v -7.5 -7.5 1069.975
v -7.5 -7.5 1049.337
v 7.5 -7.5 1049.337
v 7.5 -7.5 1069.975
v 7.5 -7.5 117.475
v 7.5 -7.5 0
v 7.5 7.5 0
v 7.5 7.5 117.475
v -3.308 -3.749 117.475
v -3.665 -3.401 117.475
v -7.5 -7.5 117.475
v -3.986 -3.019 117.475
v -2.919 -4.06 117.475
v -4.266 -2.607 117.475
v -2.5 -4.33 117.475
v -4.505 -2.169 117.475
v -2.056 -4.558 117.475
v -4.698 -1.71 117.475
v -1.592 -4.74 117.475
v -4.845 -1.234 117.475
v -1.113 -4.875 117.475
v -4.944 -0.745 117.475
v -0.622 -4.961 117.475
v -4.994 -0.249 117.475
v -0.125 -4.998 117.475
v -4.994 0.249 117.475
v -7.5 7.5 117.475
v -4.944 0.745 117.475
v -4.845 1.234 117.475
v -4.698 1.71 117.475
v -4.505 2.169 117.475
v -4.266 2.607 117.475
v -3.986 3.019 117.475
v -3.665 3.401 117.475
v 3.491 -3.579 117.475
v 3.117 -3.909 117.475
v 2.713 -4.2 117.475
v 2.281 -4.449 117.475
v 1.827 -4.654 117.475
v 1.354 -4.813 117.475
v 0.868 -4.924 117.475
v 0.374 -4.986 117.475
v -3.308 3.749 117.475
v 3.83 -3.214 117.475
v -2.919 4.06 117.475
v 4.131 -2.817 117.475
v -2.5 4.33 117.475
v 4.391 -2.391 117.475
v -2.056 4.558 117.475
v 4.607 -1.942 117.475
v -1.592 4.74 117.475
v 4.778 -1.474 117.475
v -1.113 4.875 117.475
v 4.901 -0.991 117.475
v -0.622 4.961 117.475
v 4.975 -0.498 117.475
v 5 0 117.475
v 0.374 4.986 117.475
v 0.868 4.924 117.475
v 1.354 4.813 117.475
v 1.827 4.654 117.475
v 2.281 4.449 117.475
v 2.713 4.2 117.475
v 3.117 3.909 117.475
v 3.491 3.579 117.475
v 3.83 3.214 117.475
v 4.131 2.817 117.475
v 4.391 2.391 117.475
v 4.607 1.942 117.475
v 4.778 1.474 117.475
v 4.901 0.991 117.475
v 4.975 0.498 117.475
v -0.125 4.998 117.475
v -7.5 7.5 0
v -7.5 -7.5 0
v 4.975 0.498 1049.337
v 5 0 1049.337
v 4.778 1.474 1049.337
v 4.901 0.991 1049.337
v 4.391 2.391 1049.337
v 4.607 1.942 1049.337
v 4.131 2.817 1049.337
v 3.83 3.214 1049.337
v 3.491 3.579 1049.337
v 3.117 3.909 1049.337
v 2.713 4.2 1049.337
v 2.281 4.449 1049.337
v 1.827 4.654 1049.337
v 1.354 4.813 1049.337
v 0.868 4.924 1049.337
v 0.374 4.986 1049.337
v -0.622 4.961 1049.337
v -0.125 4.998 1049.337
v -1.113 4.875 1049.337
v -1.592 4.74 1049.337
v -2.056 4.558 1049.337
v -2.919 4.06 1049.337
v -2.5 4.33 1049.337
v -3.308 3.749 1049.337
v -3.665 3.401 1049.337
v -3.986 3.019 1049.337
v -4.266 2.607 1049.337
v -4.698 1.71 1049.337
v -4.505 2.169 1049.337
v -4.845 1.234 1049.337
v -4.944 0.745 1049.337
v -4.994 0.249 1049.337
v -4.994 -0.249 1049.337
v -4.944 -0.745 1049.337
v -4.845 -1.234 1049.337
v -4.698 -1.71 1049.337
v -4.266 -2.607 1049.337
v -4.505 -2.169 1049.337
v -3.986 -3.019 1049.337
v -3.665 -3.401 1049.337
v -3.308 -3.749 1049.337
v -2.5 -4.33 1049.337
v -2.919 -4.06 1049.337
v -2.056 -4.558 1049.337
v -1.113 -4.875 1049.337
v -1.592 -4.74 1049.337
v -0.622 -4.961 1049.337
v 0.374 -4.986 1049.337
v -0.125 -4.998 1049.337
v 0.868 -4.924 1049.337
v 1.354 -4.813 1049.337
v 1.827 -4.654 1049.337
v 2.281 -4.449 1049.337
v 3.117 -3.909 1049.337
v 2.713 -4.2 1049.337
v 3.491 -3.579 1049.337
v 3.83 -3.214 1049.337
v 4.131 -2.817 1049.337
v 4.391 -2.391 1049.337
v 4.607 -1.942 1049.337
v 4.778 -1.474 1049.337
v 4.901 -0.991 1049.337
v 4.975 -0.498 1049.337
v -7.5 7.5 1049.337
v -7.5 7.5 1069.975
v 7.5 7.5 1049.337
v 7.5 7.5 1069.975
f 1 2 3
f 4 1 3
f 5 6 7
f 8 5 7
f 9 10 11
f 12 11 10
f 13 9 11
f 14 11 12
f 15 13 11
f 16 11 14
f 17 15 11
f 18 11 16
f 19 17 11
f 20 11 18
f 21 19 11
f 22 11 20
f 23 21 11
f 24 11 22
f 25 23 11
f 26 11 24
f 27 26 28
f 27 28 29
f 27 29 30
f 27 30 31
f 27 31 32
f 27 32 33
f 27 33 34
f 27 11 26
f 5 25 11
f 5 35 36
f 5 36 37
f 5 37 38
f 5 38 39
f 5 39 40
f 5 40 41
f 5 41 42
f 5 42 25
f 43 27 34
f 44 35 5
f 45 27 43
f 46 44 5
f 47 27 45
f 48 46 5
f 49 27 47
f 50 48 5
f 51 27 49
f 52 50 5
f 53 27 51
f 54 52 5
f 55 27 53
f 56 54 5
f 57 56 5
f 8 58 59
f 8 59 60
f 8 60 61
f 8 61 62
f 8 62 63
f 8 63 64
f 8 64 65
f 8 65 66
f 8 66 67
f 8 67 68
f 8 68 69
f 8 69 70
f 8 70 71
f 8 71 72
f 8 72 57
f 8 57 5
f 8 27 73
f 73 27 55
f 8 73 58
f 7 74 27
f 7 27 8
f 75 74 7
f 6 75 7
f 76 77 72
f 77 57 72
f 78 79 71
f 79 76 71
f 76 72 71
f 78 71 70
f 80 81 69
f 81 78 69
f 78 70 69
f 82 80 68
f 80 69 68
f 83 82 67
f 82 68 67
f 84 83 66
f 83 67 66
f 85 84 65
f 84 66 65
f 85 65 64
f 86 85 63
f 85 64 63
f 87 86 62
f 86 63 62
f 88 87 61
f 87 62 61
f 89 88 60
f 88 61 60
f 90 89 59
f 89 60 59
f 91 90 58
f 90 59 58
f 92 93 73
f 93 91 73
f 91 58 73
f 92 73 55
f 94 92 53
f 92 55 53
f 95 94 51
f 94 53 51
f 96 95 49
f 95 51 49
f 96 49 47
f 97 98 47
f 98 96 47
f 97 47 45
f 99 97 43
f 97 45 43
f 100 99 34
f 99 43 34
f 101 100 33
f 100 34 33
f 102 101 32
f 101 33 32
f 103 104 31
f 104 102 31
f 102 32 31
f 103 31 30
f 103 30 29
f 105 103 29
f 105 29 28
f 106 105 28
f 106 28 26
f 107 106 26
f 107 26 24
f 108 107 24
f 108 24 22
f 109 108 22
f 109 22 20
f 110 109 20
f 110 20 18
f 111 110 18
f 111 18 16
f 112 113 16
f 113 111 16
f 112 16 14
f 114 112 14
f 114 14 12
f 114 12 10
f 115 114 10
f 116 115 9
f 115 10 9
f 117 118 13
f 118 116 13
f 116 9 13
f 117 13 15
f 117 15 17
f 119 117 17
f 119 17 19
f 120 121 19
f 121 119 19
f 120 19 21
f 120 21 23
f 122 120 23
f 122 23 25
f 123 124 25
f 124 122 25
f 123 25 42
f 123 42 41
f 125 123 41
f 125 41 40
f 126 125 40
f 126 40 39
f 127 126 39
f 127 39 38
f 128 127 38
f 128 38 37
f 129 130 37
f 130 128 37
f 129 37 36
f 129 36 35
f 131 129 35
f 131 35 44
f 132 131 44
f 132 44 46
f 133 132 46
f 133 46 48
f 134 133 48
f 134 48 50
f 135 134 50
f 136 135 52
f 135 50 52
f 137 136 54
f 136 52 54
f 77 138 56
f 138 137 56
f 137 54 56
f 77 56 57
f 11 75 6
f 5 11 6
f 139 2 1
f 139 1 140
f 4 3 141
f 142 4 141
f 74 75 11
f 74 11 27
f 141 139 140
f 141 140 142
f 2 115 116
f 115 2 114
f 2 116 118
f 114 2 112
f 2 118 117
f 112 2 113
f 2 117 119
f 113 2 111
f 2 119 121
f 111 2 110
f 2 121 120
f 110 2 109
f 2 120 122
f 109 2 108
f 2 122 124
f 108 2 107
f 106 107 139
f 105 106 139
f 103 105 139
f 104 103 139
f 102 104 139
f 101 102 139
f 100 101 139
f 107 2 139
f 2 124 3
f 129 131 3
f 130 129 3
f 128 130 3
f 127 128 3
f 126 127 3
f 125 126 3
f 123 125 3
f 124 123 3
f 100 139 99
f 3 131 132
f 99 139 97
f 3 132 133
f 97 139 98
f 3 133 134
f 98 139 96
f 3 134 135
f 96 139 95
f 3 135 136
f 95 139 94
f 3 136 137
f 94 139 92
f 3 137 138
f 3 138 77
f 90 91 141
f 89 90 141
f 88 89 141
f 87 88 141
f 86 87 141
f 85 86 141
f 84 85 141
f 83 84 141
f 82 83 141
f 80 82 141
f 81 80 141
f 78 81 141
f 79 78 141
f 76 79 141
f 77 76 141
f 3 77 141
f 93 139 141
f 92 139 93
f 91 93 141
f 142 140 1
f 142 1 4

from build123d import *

# Parameters (mm, degrees)
SKETCH1_R           = 5
BOSS_EXTRUDE1_DEPTH = 1069.975
SKETCH2_W           = 15
SKETCH2_H           = 15
BOSS_EXTRUDE2_DEPTH = 117.475
SKETCH3_W           = 15
SKETCH3_H           = 15
BOSS_EXTRUDE3_DEPTH = 20.6375


with BuildPart() as part:
    # Sketch1 → Boss-Extrude1 (new body)
    with BuildSketch(Plane.XY):
        Circle(SKETCH1_R)
    extrude(amount=BOSS_EXTRUDE1_DEPTH)

    # Sketch2 → Boss-Extrude2 (add)
    with BuildSketch(Plane.XY):
        Rectangle(SKETCH2_W, SKETCH2_H)
    extrude(amount=BOSS_EXTRUDE2_DEPTH)

    # Sketch3 → Boss-Extrude3 (add)
    with BuildSketch(Plane.XY.offset(1069.975)):
        Rectangle(SKETCH3_W, SKETCH3_H)
    extrude(amount=-BOSS_EXTRUDE3_DEPTH)


solid = part.part
